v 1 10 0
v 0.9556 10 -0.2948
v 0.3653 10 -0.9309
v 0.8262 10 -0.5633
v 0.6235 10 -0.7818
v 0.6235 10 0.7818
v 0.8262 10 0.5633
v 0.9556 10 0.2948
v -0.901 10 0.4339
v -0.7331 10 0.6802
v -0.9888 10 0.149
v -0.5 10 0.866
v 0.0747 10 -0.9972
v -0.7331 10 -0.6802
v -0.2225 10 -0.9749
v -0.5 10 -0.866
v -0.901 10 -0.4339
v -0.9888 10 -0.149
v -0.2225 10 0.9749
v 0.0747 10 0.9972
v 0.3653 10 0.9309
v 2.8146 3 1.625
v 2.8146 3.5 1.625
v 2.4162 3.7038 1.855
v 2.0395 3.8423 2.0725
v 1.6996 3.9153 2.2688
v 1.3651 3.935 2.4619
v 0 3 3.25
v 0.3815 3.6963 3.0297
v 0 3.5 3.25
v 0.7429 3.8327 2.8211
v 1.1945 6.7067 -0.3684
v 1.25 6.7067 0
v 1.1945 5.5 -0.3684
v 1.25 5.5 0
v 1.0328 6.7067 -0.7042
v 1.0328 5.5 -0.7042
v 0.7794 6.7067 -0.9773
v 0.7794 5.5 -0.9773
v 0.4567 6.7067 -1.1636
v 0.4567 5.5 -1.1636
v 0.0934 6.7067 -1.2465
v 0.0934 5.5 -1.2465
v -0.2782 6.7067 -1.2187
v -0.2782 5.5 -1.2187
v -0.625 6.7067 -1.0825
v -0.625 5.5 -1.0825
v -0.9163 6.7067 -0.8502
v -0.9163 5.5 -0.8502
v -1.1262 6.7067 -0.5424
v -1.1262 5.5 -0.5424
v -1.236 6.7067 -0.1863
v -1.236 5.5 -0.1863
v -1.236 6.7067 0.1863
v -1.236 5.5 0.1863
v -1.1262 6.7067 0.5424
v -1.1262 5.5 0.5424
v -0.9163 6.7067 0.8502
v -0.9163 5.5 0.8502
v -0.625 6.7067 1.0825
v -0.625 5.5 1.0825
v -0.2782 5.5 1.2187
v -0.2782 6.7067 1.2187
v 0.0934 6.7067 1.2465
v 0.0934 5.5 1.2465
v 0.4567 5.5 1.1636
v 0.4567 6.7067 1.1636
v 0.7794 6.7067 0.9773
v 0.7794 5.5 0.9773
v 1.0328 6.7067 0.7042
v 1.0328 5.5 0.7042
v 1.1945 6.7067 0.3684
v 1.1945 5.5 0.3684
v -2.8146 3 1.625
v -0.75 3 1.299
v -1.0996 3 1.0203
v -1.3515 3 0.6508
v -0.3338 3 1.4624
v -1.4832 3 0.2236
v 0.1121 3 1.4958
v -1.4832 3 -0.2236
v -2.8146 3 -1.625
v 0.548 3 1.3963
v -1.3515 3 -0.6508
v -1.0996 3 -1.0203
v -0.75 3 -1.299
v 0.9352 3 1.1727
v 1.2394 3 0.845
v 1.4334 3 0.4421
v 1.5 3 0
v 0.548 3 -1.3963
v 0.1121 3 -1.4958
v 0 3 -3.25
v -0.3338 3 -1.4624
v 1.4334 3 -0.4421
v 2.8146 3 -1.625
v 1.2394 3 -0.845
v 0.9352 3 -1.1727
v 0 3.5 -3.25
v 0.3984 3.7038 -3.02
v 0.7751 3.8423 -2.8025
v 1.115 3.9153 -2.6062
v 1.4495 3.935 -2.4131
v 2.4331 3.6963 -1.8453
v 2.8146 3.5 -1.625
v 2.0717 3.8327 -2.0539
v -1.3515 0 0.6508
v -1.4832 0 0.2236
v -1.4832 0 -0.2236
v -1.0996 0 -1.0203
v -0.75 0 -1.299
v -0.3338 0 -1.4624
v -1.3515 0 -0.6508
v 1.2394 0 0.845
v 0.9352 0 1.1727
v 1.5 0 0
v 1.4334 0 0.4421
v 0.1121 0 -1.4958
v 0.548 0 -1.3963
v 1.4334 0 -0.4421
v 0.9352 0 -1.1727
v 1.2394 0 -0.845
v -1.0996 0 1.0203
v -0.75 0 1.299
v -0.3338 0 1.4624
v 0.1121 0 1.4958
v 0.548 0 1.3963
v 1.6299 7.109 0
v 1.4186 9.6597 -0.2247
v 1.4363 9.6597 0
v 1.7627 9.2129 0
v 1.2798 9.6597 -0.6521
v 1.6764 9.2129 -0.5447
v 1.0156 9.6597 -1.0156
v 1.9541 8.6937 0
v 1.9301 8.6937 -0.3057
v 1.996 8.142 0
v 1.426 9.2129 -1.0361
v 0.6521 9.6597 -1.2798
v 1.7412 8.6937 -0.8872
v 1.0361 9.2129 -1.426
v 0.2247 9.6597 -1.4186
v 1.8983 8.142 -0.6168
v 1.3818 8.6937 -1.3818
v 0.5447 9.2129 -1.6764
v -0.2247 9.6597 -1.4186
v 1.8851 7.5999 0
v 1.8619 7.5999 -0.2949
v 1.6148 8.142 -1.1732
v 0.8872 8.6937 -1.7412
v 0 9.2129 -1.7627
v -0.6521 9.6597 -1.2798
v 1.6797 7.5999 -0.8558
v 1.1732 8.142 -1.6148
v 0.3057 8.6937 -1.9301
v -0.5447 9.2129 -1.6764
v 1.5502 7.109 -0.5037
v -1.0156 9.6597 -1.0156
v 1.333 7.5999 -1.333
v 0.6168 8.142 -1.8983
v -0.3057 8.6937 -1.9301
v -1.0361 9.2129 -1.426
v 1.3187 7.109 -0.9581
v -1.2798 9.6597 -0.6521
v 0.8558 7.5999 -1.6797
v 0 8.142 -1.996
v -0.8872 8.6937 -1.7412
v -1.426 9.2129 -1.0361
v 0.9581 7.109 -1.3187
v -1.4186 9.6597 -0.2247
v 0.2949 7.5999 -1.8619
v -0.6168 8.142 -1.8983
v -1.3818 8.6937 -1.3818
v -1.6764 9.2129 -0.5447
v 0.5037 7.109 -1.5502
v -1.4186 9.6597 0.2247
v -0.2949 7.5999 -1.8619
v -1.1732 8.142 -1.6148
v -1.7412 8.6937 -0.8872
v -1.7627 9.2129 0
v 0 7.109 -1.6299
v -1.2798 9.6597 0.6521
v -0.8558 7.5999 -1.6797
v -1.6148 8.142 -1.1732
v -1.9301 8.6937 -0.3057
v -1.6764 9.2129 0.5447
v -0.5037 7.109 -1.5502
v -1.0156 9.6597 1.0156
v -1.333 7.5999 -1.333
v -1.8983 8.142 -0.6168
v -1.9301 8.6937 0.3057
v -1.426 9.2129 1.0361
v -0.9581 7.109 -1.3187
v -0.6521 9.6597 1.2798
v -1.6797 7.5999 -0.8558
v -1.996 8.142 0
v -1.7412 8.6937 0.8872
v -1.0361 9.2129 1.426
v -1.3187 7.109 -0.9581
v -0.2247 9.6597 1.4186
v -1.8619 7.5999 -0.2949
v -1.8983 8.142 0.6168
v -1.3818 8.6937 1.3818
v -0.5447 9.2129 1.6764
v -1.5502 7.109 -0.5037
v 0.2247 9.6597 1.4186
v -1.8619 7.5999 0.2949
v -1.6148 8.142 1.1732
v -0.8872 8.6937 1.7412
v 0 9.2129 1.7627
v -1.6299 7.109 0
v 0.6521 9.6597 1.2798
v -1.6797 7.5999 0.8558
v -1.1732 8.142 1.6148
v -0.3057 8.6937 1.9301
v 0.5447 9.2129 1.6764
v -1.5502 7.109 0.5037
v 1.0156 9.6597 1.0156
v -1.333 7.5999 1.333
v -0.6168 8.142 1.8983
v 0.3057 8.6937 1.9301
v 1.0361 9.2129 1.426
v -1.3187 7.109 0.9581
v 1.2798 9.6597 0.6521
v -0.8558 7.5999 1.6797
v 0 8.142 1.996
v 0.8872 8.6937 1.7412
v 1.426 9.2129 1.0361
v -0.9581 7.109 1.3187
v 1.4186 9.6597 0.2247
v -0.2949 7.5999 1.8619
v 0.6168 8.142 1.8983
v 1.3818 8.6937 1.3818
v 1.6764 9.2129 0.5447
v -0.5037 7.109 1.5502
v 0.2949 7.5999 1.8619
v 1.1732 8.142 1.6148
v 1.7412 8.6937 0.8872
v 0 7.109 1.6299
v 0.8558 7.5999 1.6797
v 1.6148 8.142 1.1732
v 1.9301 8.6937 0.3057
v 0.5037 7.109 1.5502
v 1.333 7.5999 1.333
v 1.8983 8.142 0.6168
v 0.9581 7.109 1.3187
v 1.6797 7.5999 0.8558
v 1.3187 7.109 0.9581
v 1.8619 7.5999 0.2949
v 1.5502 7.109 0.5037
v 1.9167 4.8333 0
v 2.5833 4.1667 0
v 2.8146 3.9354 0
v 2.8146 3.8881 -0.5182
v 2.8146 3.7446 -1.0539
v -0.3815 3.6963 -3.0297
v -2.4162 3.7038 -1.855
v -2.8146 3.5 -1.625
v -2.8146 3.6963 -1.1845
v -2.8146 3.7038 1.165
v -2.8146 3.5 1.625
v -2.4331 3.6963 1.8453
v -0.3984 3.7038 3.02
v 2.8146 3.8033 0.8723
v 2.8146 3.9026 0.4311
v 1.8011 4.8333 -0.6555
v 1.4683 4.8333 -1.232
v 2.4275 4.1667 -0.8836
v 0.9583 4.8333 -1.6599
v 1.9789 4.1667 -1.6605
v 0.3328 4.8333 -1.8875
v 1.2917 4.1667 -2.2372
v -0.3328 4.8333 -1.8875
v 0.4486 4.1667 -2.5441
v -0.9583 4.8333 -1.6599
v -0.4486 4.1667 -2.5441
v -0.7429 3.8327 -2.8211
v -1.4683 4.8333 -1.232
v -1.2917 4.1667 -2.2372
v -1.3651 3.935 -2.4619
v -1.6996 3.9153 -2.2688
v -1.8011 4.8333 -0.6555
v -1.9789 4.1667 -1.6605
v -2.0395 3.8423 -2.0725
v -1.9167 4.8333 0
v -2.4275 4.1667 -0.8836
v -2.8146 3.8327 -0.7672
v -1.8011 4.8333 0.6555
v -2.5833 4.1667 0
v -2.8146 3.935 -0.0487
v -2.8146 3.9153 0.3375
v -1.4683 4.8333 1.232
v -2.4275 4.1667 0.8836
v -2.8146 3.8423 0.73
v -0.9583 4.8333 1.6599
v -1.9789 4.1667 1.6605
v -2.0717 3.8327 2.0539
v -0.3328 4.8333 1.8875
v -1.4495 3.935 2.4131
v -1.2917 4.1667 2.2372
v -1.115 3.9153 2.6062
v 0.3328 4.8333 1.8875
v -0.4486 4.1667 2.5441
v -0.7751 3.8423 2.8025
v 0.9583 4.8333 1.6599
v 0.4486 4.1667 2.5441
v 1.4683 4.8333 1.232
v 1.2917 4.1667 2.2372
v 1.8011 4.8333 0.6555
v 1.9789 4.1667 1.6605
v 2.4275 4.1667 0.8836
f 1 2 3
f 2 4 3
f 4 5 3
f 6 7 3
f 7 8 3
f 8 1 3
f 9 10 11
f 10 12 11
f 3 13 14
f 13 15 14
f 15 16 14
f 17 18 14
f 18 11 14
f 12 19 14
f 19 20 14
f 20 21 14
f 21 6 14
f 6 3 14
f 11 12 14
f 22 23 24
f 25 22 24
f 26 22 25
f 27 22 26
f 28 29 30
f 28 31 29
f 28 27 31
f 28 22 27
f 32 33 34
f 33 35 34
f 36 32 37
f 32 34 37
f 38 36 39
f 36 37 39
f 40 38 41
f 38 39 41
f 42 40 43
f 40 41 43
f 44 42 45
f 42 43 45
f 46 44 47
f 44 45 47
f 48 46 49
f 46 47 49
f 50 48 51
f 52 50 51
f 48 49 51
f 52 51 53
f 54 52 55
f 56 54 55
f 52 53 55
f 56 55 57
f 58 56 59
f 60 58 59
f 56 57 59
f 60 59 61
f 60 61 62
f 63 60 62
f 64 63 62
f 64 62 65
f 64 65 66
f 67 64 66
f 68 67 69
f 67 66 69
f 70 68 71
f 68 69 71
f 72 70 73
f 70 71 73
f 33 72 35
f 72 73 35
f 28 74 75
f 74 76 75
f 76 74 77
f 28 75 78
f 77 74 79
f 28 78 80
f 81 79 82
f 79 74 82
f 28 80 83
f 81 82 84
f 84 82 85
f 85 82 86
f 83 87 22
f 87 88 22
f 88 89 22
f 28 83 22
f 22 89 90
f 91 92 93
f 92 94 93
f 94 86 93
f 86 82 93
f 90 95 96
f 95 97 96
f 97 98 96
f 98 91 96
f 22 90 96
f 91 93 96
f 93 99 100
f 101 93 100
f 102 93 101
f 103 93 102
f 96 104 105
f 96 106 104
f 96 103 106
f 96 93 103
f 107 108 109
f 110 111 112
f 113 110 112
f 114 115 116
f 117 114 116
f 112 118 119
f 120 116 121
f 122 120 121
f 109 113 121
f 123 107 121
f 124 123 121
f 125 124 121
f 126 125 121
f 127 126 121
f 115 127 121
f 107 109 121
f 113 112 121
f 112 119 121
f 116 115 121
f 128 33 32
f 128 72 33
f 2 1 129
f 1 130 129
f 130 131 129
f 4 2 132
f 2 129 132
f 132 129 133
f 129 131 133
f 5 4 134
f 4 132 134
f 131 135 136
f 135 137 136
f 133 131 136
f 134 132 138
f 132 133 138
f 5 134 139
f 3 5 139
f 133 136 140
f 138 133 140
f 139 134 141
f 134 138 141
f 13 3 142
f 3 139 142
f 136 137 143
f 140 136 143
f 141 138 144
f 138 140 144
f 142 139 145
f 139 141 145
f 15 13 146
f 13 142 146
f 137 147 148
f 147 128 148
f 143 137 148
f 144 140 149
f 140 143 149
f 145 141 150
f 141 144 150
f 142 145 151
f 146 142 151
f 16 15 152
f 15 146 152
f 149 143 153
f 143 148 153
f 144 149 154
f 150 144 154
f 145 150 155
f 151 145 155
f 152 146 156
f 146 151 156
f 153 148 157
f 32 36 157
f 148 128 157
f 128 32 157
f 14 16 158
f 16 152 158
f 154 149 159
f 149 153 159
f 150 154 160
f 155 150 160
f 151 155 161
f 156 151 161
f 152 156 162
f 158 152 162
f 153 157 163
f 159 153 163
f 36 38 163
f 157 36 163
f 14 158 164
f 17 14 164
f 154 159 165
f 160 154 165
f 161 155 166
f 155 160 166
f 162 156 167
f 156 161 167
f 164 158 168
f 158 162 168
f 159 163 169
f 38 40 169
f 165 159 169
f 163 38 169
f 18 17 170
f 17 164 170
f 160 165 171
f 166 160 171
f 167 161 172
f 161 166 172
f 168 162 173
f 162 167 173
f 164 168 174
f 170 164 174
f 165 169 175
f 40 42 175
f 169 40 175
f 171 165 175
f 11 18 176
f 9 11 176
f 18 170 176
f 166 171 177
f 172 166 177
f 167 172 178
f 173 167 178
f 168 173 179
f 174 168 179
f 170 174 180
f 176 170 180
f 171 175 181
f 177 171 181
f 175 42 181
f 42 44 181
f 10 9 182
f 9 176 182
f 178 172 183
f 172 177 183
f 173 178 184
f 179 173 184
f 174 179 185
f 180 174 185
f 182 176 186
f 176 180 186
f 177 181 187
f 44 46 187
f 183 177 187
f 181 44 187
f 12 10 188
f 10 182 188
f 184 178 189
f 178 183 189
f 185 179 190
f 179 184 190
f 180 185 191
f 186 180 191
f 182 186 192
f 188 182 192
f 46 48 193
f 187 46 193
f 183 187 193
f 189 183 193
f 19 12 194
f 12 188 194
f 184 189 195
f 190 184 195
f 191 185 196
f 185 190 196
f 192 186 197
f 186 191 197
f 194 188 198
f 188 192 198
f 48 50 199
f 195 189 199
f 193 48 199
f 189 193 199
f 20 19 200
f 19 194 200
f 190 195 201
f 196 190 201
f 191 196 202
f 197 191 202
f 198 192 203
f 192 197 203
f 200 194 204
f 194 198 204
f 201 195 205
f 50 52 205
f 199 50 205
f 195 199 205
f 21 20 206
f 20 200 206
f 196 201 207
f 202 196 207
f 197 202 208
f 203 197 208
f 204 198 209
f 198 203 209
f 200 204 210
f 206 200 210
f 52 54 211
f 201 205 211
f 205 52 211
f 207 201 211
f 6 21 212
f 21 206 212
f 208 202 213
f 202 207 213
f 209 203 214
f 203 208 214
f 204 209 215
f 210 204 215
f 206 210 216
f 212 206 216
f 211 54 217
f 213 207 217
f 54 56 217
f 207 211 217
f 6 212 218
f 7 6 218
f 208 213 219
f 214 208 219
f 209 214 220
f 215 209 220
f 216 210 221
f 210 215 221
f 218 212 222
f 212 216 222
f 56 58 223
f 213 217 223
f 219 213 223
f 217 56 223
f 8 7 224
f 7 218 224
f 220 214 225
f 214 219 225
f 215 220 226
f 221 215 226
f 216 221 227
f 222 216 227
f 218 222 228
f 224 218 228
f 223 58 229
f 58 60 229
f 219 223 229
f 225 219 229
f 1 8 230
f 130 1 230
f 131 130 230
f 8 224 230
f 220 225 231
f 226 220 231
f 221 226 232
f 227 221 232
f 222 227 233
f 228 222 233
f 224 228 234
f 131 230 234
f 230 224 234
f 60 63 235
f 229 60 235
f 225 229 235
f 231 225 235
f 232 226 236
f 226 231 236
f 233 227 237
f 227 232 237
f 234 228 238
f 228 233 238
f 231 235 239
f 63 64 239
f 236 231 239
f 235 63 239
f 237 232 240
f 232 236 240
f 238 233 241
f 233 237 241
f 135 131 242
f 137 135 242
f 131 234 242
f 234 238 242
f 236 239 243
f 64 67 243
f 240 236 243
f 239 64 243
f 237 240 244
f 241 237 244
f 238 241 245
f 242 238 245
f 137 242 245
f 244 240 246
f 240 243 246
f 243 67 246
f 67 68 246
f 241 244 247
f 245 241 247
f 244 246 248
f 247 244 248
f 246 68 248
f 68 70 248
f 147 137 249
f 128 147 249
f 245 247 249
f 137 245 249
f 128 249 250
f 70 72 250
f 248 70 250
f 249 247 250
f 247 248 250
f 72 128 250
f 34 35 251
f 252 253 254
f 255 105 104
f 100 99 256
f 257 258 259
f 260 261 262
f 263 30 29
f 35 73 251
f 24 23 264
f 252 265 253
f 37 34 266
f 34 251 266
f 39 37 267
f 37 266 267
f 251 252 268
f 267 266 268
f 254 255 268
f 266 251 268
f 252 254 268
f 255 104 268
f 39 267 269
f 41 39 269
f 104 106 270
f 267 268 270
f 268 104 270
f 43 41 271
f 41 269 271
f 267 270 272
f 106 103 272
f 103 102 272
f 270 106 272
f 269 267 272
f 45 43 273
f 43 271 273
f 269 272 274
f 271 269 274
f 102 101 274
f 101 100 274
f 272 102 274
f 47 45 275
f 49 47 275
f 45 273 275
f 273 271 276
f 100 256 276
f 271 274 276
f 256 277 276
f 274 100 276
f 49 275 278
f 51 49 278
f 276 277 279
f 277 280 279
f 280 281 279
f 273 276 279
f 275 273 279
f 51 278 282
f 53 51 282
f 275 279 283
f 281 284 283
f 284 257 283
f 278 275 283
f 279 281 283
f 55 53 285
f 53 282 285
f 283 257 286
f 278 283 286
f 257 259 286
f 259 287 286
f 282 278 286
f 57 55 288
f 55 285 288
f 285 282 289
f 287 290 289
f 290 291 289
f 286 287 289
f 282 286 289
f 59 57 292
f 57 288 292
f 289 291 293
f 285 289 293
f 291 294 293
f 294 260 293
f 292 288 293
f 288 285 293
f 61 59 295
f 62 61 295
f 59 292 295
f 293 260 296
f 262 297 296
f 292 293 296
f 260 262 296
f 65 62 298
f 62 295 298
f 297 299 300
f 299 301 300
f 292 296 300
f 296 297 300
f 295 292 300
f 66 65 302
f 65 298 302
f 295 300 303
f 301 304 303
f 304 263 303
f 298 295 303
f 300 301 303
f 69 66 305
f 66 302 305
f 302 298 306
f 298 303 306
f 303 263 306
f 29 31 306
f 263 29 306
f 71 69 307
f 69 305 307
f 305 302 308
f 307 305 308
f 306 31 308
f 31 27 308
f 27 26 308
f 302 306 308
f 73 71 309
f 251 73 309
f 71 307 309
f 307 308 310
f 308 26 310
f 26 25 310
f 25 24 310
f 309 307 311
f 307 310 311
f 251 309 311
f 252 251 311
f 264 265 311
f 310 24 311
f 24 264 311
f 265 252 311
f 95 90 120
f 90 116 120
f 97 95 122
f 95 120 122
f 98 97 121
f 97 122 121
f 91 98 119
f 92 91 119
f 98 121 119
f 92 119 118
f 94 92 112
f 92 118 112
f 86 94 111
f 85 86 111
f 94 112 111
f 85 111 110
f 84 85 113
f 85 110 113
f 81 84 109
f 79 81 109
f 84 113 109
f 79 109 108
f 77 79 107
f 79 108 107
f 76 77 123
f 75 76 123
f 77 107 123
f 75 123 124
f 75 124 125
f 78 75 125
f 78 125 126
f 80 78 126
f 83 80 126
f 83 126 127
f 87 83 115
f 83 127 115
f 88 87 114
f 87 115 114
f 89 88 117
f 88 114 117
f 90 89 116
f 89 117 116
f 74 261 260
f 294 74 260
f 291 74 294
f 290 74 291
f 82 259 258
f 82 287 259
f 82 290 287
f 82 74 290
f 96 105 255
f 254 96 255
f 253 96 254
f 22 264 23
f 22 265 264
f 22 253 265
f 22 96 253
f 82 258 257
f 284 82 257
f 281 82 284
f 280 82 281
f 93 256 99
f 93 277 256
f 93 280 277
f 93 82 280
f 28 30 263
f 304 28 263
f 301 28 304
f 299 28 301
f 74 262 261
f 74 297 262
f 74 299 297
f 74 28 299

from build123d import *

# Parameters (mm, degrees)
SKETCH3_OUTSIDE_W  = 11.216
SKETCH3_OUTSIDE_H  = 11.216
CUT_EXTRUDE1_DEPTH = 8


with BuildPart() as part:
    # Sketch1 → Revolve3 (revolve)
    with BuildSketch(Plane.XY):
        with BuildLine():
            ThreePointArc((1, 10), (1.994262201, 8.419337011), (1.25, 6.706699693))
            Line((1.25, 6.706699693), (1.25, 5.5))
            Line((1.25, 5.5), (0, 5.5))
            Line((0, 5.5), (0, 10))
            Line((0, 10), (1, 10))
        make_face()
        Polygon((0, 0), (0, 5.5), (1.25, 5.5), (3.25, 3.5), (3.25, 3), (1.5, 3), (1.5, 0), align=None)
    revolve(axis=Axis((0, 5.5, 0), (0, 1, 0)))

    # Sketch3 outside → Cut-Extrude1 (cut, through all)
    with BuildSketch(Plane.XZ.offset(-3)):
        Rectangle(SKETCH3_OUTSIDE_W, SKETCH3_OUTSIDE_H)
        Polygon((0, 3.25), (-2.814582562, 1.625), (-2.814582562, -1.625), (0, -3.25), (2.814582562, -1.625), (2.814582562, 1.625), align=None, mode=Mode.SUBTRACT)
    extrude(amount=-CUT_EXTRUDE1_DEPTH, mode=Mode.SUBTRACT)


solid = part.part
